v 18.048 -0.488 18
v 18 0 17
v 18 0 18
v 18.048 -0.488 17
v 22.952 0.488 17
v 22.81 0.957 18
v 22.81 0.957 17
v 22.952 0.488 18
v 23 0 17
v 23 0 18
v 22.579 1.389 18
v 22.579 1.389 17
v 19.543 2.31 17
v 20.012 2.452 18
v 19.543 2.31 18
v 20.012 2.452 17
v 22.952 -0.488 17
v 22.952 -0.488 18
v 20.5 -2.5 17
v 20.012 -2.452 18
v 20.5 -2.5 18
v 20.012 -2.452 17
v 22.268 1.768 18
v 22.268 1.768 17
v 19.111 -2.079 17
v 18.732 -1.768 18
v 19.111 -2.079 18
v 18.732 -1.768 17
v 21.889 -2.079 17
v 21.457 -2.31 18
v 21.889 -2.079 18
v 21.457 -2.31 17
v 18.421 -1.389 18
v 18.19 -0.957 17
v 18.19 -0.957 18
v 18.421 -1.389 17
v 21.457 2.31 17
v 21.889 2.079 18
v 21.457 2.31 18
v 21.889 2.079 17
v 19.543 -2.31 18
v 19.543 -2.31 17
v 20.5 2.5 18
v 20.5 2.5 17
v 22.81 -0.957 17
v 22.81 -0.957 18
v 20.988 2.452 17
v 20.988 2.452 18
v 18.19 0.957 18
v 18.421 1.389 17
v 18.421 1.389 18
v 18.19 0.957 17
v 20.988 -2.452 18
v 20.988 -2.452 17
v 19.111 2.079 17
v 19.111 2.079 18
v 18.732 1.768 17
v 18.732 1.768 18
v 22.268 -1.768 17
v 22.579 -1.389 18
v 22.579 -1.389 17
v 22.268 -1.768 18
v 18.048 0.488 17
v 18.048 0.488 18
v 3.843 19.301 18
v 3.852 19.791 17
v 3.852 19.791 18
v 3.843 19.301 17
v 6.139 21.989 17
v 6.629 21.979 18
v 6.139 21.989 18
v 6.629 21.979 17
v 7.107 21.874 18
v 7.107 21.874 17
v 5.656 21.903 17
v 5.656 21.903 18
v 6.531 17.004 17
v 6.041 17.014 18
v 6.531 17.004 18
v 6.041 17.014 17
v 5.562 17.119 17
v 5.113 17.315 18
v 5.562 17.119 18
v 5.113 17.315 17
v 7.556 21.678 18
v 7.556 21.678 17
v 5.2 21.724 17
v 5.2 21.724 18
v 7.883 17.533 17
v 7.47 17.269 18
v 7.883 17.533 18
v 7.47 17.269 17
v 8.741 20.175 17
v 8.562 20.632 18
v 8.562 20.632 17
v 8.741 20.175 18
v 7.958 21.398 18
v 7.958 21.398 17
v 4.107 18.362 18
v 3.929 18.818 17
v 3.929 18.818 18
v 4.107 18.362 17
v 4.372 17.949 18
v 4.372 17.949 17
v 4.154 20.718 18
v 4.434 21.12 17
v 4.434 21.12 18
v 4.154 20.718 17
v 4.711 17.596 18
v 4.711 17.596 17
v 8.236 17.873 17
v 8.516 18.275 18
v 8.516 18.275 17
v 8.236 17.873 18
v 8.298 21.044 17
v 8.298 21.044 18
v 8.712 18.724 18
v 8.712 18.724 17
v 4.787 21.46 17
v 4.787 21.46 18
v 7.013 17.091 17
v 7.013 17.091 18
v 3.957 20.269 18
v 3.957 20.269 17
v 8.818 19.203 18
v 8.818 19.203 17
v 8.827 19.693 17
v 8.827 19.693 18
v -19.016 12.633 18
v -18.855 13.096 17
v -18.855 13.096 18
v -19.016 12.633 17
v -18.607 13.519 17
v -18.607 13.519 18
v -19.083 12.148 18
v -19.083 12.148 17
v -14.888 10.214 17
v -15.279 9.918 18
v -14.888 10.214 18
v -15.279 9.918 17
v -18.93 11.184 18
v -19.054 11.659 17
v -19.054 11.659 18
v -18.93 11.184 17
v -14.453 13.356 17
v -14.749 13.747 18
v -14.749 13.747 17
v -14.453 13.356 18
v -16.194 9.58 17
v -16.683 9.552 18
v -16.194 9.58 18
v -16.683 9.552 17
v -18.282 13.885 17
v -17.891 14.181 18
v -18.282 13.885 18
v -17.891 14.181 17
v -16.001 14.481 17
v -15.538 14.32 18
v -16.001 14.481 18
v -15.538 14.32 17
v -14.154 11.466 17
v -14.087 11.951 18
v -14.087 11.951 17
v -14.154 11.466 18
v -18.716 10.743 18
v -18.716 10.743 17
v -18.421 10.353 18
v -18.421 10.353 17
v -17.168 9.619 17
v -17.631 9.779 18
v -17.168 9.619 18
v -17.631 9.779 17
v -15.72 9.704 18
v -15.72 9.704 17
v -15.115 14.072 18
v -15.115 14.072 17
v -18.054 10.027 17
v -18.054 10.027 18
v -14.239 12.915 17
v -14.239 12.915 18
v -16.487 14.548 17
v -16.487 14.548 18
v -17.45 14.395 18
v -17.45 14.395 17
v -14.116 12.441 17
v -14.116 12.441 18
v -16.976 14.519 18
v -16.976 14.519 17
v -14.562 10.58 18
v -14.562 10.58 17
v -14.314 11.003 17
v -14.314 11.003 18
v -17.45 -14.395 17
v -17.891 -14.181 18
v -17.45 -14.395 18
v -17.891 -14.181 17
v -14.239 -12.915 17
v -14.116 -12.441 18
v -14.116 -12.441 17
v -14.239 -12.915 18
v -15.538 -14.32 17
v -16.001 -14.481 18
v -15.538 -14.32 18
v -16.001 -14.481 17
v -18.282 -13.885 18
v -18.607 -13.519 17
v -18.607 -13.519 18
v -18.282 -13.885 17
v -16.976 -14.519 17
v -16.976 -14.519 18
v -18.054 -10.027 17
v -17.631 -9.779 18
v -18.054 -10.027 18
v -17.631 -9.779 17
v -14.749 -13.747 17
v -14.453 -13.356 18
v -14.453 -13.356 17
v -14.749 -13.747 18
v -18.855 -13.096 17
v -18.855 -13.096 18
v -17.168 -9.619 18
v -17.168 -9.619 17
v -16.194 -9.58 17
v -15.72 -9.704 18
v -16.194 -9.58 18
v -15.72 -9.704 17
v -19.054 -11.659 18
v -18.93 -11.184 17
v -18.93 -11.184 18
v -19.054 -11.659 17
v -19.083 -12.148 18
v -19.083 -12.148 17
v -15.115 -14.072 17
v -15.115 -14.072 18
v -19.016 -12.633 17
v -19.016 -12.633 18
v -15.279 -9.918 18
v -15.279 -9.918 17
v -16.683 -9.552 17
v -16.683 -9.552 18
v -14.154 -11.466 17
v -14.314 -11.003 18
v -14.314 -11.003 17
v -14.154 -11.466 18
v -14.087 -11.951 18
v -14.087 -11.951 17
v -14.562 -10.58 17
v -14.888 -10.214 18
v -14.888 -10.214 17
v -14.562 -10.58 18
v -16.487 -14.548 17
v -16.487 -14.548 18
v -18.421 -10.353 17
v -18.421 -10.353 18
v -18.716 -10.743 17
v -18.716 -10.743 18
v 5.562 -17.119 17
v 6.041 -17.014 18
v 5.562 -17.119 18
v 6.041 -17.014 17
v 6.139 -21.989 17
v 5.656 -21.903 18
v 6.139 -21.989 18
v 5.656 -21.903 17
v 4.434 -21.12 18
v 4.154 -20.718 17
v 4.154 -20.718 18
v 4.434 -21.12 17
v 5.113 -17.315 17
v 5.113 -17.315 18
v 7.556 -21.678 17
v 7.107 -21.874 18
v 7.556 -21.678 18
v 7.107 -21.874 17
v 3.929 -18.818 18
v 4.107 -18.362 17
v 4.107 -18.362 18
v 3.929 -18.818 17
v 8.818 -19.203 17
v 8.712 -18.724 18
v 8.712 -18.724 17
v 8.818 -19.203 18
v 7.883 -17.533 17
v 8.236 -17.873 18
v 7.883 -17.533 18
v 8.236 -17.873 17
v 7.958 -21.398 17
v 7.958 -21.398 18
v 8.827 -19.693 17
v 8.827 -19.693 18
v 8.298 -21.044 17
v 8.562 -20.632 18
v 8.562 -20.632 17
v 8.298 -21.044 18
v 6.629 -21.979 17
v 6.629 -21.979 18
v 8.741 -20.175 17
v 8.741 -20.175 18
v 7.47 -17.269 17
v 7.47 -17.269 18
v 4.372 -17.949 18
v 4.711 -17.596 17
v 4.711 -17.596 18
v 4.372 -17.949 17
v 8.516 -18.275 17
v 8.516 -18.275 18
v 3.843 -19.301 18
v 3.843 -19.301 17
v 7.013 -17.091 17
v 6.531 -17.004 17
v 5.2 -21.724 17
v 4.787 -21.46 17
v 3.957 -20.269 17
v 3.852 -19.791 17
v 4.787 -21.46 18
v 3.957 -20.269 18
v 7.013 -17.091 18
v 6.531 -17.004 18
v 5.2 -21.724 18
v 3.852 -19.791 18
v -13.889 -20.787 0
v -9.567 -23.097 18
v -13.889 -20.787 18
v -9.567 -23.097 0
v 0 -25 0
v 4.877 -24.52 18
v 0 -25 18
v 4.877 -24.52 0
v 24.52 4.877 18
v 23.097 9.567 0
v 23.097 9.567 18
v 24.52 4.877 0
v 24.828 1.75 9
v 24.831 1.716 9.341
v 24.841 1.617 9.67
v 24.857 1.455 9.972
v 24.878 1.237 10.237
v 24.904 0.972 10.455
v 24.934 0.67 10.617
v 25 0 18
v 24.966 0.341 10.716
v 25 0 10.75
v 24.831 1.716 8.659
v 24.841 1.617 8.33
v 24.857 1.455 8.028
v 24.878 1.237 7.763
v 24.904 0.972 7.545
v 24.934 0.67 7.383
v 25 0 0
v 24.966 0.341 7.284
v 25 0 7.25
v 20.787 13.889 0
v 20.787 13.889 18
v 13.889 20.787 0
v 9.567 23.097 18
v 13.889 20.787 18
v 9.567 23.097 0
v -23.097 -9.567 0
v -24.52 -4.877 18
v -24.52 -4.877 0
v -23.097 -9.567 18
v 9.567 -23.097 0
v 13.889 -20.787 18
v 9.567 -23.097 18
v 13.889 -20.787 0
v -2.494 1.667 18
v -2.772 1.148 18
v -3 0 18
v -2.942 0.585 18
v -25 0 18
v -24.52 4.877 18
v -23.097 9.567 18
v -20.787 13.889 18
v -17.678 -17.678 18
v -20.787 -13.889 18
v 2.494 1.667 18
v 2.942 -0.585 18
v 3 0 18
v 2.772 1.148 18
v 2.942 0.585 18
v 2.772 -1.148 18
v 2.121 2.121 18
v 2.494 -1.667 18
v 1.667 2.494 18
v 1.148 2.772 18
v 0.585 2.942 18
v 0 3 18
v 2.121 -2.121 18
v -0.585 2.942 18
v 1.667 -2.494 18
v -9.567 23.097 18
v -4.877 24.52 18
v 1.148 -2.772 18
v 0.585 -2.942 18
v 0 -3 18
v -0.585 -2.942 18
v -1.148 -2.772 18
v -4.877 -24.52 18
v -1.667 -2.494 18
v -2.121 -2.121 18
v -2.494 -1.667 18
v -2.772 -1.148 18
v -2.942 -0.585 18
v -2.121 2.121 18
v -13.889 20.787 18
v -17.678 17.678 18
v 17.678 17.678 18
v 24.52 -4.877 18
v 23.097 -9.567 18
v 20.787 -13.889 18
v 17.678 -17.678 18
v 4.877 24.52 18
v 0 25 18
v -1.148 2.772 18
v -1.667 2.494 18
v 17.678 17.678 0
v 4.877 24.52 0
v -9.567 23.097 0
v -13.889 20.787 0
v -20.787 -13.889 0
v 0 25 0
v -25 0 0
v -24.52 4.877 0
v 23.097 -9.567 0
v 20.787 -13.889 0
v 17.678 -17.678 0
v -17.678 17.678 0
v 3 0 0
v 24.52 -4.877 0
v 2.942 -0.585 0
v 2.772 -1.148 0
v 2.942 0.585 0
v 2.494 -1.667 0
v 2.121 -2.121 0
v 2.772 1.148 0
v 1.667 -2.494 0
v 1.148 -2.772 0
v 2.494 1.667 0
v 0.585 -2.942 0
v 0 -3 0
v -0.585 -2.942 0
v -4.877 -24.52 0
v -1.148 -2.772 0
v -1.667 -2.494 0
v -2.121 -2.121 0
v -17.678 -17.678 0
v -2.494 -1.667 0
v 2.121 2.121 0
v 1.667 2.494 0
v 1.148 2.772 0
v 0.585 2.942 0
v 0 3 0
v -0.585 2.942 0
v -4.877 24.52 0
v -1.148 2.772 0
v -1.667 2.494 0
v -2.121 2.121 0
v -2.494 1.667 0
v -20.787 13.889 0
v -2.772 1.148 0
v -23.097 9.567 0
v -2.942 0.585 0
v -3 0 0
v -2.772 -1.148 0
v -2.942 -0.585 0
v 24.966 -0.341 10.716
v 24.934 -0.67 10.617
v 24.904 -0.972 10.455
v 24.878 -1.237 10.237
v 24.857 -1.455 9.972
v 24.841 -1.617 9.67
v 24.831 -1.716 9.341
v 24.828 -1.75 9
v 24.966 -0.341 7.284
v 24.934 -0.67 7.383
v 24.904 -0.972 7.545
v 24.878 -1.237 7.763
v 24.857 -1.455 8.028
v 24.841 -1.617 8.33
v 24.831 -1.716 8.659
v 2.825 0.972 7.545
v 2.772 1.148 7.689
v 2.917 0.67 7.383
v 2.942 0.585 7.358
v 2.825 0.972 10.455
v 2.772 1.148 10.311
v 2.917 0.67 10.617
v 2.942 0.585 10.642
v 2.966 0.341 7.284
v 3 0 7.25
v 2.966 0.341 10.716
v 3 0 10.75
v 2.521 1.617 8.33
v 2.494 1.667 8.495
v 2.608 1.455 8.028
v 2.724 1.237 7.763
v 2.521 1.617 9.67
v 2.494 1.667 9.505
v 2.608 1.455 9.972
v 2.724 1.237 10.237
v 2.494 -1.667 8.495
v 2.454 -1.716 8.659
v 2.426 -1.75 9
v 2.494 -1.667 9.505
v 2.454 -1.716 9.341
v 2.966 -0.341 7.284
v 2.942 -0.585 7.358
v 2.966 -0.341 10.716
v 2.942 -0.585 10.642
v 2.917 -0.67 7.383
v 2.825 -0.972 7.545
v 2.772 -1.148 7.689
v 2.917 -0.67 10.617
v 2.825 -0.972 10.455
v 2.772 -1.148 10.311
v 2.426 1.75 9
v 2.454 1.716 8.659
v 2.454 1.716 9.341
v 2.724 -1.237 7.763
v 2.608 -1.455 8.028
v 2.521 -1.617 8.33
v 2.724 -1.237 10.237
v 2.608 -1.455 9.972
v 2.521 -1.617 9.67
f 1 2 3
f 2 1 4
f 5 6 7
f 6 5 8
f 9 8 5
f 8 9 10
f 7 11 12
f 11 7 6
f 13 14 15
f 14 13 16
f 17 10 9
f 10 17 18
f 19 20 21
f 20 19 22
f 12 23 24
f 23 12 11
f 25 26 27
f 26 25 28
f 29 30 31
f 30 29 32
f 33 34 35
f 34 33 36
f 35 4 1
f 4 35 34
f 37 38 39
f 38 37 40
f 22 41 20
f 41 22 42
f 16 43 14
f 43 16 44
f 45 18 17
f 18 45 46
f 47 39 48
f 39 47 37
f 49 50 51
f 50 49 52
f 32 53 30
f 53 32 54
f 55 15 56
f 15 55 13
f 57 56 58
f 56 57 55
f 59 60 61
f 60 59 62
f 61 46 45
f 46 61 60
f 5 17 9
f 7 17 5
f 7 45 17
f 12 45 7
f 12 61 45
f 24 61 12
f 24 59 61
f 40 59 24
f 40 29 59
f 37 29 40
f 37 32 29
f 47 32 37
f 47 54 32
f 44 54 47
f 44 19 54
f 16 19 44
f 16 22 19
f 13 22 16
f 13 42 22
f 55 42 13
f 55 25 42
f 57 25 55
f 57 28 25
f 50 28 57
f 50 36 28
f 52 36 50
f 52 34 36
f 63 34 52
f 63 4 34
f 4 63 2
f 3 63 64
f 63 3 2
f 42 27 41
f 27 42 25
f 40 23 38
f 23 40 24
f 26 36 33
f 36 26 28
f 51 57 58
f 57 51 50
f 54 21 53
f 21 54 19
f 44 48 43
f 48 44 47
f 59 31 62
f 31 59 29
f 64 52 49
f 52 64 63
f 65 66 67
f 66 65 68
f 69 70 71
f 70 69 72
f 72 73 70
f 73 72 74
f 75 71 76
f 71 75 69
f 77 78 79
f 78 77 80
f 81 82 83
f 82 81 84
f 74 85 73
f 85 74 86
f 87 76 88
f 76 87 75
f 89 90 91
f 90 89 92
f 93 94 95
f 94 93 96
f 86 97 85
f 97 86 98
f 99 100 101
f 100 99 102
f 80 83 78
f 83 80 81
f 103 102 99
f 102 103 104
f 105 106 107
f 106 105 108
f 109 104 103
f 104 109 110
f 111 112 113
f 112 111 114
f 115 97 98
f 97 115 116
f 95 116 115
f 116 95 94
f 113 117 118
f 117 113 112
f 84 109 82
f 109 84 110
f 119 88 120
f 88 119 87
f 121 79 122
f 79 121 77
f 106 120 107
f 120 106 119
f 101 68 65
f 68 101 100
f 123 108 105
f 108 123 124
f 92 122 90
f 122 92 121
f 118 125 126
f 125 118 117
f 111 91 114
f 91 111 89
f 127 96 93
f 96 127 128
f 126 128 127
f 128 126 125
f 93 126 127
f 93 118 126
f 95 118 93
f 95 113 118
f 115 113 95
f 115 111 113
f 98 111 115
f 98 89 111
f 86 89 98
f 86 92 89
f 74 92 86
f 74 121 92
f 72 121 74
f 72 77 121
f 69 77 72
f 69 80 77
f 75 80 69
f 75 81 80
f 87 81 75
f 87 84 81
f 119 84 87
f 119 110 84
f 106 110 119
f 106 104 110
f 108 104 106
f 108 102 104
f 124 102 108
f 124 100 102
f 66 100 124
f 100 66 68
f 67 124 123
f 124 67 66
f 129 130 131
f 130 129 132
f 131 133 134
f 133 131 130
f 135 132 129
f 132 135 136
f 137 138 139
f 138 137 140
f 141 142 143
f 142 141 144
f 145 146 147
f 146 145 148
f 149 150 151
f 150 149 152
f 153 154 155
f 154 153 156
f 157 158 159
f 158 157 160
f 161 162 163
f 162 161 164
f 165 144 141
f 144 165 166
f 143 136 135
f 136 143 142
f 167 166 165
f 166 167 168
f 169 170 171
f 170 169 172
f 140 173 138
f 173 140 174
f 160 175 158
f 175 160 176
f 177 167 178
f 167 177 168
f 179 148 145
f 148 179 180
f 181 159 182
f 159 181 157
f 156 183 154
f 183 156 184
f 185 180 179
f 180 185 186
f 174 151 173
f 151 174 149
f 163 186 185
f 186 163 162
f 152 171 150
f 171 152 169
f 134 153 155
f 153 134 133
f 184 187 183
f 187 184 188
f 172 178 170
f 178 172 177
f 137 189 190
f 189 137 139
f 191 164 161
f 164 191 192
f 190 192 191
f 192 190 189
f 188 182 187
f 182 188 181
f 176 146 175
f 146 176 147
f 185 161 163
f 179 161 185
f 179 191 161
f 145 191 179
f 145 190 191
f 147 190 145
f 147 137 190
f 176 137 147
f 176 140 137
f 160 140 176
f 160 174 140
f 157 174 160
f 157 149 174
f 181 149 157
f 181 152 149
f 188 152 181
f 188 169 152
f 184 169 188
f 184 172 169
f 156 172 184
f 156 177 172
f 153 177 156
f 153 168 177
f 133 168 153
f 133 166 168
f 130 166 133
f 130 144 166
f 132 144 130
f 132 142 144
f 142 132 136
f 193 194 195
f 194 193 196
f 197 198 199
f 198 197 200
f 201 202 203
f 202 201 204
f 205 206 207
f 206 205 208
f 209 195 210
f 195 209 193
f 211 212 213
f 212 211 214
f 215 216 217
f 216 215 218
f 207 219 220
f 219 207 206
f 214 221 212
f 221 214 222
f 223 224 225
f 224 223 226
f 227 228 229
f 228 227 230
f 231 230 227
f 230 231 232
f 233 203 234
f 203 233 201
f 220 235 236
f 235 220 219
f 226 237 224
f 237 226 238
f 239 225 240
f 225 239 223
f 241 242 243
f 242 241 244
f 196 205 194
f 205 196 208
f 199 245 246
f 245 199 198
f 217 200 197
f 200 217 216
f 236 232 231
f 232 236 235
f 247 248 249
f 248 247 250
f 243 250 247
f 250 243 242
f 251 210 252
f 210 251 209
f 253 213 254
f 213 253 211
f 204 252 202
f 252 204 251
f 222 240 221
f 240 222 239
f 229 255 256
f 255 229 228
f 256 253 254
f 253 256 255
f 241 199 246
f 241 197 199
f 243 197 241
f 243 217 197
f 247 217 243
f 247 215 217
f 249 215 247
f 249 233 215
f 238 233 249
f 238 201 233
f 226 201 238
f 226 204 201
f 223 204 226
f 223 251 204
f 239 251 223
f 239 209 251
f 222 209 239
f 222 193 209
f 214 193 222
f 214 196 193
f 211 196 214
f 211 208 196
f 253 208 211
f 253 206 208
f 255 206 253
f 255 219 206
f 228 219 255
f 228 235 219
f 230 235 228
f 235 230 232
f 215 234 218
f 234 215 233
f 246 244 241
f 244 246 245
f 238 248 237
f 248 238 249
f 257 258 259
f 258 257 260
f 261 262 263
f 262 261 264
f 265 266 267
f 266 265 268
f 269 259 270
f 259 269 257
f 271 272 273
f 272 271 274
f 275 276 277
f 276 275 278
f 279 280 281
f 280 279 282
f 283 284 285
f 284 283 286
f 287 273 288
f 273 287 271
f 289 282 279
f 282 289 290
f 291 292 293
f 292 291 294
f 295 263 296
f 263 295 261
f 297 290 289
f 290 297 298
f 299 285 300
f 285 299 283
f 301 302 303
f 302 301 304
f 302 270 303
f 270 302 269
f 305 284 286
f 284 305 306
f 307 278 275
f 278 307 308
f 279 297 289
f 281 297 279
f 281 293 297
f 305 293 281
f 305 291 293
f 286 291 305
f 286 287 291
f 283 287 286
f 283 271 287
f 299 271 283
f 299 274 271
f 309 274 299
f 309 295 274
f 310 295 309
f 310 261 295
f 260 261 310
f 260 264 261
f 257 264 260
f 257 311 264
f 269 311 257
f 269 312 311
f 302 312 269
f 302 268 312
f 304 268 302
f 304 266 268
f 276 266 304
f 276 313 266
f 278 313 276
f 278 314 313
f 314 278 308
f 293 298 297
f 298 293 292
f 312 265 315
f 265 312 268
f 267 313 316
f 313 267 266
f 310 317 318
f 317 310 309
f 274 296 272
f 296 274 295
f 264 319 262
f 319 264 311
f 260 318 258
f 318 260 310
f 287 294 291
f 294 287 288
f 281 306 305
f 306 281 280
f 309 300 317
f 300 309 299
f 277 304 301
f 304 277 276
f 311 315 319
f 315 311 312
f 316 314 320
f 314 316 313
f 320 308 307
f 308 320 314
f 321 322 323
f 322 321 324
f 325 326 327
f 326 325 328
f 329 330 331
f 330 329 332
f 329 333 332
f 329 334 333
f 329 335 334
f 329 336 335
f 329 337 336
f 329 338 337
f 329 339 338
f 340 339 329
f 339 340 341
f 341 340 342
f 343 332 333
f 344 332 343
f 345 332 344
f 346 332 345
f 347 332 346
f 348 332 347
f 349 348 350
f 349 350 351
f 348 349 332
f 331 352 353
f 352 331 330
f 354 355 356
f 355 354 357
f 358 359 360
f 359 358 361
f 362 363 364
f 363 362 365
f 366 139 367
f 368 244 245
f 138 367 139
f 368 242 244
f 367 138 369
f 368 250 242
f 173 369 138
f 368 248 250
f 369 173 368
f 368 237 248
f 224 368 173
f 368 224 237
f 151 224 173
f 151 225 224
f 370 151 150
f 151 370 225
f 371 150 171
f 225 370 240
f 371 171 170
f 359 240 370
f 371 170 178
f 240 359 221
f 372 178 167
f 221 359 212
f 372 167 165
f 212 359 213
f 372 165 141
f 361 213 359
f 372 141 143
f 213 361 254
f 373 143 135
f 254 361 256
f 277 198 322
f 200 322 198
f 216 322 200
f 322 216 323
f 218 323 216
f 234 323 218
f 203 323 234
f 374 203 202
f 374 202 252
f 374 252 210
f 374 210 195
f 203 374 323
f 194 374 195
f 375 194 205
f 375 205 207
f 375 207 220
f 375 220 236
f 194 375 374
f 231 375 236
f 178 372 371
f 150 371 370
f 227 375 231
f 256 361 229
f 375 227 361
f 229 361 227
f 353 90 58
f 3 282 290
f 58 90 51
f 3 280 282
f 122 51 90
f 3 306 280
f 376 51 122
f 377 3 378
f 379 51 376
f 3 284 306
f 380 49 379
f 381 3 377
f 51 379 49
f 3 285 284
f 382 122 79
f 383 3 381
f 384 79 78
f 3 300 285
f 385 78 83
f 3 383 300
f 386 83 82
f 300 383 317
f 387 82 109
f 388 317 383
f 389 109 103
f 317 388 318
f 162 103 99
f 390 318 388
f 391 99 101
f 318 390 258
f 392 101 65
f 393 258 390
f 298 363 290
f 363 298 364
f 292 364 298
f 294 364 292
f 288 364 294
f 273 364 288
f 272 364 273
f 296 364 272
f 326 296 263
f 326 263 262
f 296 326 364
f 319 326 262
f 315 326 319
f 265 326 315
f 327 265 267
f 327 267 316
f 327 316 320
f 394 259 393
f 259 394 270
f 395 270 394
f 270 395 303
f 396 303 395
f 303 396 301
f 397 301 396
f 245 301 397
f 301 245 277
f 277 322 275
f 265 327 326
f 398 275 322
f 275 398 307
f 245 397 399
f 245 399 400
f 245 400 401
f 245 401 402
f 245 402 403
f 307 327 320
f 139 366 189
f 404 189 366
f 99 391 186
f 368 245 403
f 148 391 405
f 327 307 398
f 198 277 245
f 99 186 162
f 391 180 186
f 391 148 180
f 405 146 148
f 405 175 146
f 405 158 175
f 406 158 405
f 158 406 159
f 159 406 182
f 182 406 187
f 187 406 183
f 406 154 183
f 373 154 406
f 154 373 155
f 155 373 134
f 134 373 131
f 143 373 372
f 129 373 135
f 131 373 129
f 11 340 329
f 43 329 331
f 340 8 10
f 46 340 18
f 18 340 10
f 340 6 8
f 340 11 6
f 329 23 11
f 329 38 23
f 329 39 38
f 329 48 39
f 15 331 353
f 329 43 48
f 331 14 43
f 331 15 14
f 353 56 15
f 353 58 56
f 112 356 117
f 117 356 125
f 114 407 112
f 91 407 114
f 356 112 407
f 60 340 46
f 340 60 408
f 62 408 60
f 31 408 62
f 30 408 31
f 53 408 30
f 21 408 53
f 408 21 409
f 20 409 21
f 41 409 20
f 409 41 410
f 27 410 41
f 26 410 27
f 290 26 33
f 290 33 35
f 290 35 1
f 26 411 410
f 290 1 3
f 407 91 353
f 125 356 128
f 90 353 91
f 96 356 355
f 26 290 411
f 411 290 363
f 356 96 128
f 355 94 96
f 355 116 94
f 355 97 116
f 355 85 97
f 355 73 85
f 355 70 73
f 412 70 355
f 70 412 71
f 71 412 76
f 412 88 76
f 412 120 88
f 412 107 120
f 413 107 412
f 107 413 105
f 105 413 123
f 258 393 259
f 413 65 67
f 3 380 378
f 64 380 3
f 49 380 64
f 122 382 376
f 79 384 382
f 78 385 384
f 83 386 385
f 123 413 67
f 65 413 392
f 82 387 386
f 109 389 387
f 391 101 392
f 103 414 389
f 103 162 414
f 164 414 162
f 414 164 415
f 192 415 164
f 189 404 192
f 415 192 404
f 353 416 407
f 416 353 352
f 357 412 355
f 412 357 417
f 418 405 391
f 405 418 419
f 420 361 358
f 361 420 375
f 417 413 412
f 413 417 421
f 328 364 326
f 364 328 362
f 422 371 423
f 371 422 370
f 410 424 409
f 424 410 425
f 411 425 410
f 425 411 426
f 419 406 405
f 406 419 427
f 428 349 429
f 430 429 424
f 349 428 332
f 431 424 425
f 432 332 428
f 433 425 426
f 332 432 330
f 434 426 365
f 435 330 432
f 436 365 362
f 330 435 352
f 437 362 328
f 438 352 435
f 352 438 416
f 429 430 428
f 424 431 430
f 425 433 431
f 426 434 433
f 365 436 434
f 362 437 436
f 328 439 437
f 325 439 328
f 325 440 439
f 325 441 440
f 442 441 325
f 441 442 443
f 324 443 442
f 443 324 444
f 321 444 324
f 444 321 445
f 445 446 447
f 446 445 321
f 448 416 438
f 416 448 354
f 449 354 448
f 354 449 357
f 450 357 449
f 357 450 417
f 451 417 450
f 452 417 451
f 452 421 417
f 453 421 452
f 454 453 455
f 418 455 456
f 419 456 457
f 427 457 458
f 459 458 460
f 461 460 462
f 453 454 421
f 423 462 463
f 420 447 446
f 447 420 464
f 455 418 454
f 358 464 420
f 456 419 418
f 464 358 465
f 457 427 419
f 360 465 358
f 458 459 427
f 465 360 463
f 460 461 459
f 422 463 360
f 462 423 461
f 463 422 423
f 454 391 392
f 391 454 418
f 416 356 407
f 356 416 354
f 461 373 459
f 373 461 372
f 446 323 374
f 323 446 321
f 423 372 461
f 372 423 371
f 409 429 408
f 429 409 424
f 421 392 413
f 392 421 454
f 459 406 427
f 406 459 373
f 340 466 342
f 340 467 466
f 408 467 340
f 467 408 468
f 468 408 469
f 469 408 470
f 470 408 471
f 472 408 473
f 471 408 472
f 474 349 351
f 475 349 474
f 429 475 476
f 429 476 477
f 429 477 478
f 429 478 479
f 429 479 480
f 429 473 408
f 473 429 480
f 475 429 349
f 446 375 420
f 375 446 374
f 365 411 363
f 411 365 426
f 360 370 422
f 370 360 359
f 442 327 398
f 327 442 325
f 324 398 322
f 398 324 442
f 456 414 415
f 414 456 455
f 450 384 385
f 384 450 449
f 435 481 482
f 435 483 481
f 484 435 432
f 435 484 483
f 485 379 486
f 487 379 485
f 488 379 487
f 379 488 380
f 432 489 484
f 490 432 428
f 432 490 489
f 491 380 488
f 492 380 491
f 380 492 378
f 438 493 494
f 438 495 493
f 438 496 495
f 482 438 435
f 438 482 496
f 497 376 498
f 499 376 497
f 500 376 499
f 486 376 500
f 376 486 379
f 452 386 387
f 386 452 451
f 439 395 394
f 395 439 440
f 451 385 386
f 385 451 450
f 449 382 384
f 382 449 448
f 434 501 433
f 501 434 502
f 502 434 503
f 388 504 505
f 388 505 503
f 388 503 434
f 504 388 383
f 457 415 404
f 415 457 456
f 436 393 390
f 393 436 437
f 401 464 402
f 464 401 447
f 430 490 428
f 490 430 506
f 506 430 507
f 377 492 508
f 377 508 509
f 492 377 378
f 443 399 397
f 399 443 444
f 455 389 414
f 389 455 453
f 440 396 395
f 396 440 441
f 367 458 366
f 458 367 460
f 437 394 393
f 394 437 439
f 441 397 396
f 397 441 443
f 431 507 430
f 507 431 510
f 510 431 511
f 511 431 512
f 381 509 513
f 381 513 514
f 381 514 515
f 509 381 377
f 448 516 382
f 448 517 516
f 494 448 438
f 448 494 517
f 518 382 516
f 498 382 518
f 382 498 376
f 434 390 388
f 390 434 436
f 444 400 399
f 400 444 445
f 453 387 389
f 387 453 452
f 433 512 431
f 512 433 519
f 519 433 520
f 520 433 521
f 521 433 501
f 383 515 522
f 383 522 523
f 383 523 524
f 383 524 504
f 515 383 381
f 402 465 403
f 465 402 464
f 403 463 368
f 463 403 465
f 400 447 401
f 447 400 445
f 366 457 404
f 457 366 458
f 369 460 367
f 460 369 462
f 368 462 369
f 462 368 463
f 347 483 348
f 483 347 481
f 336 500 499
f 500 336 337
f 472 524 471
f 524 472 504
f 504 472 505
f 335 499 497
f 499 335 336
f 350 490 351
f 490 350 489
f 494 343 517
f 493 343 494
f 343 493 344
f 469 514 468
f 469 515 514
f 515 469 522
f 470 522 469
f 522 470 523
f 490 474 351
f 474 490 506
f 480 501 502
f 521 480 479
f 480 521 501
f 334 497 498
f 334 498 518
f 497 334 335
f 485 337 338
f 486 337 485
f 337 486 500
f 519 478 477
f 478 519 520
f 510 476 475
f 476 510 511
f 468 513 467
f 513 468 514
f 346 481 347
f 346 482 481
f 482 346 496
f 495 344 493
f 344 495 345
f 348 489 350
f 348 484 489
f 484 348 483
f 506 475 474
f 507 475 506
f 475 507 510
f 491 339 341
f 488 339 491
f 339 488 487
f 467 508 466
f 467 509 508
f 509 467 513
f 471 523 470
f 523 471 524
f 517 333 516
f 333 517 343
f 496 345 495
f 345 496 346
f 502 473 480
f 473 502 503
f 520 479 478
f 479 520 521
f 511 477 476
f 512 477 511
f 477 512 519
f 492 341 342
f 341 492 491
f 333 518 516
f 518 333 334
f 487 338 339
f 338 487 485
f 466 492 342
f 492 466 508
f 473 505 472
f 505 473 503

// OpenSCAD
$fn = 32;

// ----------------------------------------------------------------------
// Control knob: dimpled knob
// ----------------------------------------------------------------------

// --- parameters (mm) ---
dimp_d = 5;               // finger dimple diameter
n_dimp = 5;               // number of dimples
dimp_r = 20.5;            // dimple ring radius
knob_d = 50;              // knob body diameter
knob_h = 18;              // knob body height
bore_d = 6;               // shaft bore diameter
set_d = 3.5;              // set screw bore diameter
fit_tol = 0.05;           // tolerance for press fits, mm
free_tol = 0.3;           // tolerance for clearance fits, mm

dimp_step = 360 / n_dimp;  // dimple angular step

difference() {
  cylinder(h = knob_h, d = knob_d);
  translate([0, 0, -1]) cylinder(h = knob_h + 2, d = bore_d);
  translate([-1, 0, knob_h / 2]) rotate([0, 90, 0])
    cylinder(h = knob_d / 2 + bore_d / 2 + 2, d = set_d);  for (i = [0 : n_dimp - 1])
    rotate([0, 0, i * dimp_step])
      translate([dimp_r, 0, knob_h - 1])
        cylinder(h = 2, d = dimp_d);
}
